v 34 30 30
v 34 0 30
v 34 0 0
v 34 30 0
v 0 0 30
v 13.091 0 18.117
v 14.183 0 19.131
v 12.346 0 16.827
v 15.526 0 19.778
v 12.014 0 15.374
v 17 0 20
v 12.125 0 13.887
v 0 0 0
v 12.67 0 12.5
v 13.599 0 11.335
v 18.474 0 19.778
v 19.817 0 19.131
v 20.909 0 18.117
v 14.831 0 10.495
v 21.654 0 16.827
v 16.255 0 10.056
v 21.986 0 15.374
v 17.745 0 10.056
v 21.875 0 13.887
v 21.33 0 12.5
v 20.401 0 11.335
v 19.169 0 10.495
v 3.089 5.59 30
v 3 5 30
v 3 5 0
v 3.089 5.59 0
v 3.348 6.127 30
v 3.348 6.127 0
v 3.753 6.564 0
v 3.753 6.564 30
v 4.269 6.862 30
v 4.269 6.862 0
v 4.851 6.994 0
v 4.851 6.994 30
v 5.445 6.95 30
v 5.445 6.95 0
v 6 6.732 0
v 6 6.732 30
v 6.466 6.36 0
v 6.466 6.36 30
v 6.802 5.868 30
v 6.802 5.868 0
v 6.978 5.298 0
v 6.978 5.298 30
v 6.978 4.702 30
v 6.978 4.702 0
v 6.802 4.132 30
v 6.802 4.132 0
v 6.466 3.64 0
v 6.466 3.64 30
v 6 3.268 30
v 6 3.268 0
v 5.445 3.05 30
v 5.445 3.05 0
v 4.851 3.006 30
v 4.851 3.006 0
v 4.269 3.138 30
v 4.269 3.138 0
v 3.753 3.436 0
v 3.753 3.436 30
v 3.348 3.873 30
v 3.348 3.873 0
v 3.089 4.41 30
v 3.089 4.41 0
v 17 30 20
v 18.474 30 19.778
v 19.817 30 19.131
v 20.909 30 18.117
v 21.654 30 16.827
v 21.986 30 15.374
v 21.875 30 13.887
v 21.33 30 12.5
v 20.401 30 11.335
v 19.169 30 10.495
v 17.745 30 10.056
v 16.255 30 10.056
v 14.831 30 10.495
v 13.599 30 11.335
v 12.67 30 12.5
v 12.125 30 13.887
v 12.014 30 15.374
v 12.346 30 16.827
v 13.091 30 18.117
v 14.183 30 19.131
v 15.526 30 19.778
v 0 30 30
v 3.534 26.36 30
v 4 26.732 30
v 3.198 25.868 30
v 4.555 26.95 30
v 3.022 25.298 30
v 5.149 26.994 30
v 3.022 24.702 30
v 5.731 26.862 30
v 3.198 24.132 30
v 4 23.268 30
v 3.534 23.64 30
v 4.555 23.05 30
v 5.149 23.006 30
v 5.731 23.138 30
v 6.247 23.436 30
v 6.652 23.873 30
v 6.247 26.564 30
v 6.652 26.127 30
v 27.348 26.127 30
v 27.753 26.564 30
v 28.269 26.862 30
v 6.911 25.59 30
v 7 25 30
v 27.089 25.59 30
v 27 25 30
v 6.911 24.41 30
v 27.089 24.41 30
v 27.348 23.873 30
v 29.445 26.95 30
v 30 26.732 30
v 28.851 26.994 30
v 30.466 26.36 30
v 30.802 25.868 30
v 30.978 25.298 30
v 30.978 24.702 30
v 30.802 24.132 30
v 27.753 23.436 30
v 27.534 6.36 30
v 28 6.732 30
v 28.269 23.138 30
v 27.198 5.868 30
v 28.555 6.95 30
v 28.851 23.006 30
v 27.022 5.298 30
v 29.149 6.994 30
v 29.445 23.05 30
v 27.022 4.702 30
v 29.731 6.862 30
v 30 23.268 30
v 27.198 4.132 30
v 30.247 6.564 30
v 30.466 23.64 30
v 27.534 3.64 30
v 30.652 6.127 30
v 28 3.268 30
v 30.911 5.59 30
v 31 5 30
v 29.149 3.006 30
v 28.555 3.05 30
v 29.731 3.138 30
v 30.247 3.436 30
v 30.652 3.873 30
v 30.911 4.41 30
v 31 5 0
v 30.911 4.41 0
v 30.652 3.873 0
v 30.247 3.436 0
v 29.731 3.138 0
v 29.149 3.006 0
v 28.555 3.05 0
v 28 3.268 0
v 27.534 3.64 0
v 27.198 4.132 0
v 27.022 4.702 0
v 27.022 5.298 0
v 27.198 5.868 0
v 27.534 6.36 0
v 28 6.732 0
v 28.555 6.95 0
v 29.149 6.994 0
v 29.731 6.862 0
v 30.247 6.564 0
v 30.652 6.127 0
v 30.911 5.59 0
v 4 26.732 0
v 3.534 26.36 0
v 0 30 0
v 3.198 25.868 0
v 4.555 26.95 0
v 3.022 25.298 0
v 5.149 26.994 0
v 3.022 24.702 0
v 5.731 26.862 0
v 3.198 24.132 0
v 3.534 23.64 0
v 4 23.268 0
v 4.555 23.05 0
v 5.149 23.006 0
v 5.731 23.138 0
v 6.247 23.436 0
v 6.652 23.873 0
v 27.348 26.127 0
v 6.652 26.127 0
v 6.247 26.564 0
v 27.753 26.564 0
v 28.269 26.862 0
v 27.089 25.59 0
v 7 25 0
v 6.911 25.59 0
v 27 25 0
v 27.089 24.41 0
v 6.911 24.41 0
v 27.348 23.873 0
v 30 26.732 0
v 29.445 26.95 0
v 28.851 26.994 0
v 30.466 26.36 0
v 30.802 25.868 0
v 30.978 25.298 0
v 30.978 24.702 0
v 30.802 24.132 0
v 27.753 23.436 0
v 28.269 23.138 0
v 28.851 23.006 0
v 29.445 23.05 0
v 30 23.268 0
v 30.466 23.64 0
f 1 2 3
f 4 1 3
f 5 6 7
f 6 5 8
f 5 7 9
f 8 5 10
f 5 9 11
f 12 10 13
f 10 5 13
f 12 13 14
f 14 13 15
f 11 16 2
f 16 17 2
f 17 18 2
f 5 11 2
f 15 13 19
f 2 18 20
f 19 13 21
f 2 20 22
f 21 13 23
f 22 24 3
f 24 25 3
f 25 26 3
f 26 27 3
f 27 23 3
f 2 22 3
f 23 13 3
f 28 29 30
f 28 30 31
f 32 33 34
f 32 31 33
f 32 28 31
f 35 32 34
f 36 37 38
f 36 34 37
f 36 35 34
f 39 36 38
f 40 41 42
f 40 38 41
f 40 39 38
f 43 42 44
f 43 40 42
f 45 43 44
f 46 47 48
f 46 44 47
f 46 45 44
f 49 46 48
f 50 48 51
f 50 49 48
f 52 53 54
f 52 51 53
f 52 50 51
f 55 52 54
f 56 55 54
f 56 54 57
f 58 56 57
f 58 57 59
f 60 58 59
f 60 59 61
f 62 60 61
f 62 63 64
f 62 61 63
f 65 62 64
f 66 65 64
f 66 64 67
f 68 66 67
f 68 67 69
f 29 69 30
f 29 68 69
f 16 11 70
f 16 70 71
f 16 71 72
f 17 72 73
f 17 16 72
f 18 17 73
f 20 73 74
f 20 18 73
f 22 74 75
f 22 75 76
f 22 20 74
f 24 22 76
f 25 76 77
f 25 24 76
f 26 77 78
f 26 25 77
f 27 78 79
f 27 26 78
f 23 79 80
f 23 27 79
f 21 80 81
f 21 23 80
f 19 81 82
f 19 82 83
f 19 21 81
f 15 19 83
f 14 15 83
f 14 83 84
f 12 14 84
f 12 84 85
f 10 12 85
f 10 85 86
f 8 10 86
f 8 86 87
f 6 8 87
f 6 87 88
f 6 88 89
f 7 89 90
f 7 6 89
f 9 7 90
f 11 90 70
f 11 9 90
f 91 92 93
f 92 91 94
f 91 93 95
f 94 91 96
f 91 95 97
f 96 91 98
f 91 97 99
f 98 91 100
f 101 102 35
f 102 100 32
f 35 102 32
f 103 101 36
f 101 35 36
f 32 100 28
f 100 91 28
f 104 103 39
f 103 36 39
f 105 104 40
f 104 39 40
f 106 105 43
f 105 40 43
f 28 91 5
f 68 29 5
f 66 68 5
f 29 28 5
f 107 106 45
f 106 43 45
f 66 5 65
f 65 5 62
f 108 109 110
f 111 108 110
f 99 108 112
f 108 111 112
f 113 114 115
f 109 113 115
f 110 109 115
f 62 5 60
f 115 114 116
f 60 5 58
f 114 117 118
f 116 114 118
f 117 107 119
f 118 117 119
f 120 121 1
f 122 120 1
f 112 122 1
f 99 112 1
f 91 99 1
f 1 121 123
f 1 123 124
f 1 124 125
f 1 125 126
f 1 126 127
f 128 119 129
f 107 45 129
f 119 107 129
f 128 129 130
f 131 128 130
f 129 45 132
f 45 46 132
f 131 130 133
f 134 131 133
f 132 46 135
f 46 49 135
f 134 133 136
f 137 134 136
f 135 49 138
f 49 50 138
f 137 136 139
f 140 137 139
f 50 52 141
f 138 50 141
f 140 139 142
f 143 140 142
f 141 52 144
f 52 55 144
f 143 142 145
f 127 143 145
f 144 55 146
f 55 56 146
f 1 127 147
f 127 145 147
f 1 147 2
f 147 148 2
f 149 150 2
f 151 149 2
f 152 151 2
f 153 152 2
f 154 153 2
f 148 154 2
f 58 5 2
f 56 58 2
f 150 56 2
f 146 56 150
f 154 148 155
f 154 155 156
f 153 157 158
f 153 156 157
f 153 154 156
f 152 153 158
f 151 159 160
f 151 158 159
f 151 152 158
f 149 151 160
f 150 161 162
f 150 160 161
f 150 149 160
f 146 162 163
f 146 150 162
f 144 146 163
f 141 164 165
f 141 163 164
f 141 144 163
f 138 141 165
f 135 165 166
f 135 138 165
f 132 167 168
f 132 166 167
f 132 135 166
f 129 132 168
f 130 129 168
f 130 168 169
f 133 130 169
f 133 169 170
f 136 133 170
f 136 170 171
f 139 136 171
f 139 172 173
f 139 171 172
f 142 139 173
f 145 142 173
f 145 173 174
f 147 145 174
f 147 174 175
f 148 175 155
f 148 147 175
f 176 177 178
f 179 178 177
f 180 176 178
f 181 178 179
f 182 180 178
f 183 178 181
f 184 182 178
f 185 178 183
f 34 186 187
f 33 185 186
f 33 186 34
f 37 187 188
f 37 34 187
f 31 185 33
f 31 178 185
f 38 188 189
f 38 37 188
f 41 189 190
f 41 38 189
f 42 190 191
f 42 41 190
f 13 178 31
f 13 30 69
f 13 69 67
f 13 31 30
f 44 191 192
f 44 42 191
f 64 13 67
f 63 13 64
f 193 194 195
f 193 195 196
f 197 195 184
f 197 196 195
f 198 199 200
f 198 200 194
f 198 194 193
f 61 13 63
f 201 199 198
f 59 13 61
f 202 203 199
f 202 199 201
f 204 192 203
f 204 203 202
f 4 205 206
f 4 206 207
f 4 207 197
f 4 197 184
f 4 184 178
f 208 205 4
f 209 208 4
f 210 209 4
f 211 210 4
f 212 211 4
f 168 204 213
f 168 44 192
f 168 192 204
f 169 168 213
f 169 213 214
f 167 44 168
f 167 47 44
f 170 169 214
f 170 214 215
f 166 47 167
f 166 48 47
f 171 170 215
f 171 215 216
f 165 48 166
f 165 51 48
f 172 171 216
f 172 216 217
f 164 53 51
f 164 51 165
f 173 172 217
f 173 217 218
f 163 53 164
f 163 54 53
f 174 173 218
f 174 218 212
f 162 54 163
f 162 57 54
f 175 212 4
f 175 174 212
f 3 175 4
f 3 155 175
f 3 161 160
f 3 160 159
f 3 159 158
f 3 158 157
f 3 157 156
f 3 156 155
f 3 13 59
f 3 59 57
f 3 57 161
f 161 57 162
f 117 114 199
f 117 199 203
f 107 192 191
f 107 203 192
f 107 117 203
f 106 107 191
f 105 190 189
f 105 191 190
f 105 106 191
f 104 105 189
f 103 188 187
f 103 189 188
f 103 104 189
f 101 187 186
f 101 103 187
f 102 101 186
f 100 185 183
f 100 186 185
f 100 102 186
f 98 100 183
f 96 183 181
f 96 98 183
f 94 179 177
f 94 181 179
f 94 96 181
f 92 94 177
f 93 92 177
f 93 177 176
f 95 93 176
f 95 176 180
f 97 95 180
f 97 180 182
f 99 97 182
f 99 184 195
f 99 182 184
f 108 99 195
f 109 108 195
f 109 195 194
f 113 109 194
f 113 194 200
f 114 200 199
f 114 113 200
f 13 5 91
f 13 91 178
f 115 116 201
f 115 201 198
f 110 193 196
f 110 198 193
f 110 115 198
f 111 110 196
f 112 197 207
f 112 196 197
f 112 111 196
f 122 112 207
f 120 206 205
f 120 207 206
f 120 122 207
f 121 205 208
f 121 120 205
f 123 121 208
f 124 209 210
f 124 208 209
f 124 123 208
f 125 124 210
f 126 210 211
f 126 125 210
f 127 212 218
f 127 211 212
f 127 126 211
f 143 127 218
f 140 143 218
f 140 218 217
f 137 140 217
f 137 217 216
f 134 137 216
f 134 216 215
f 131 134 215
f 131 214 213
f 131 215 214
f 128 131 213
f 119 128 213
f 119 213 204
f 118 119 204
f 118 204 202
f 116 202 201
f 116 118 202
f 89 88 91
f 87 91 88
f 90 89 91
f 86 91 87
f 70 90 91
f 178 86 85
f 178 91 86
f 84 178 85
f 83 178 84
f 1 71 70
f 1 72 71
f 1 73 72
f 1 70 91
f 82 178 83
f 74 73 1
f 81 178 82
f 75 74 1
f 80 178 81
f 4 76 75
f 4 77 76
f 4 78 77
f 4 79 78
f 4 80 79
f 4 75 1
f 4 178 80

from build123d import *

# Parameters (mm, degrees)
SKETCH1_W               = 34
SKETCH1_H               = 30
SKETCH1_R               = 5
BOSS_EXTRUDE1_DEPTH     = 30
CUT_EXTRUDE1_DEPTH      = 55.369108876
CUT_EXTRUDE1_DEPTH_BACK = 55.369108876
SKETCH2_R               = 2


with BuildPart() as part:
    # Sketch1 → Boss-Extrude1 (new body)
    with BuildSketch(Plane(origin=(0, 0, 0), x_dir=(1, 0, 0), z_dir=(0, 1, 0))):
        with Locations((17, -15)):
            Rectangle(SKETCH1_W, SKETCH1_H)
        with Locations(Location((17, -15, 0), (0, 0, 270))):
            Circle(SKETCH1_R, mode=Mode.SUBTRACT)
    extrude(amount=BOSS_EXTRUDE1_DEPTH)

    # Sketch2 → Cut-Extrude1 (cut, two sides: drawn at the far end of the back side and taken through both)
    with BuildSketch(Plane(origin=(0, 0, 0), x_dir=(-1, 0, 0), z_dir=(0, 0, -1)).offset(-CUT_EXTRUDE1_DEPTH_BACK)):
        with Locations((-29, 25)):
            Circle(SKETCH2_R)
        with Locations(Location((-5, 25, 0), (0, 0, 180))):
            Circle(SKETCH2_R)
        with Locations((-5, 5)):
            Circle(SKETCH2_R)
        with Locations(Location((-29, 5, 0), (0, 0, 180))):
            Circle(SKETCH2_R)
    extrude(amount=CUT_EXTRUDE1_DEPTH + CUT_EXTRUDE1_DEPTH_BACK, mode=Mode.SUBTRACT)


solid = part.part
